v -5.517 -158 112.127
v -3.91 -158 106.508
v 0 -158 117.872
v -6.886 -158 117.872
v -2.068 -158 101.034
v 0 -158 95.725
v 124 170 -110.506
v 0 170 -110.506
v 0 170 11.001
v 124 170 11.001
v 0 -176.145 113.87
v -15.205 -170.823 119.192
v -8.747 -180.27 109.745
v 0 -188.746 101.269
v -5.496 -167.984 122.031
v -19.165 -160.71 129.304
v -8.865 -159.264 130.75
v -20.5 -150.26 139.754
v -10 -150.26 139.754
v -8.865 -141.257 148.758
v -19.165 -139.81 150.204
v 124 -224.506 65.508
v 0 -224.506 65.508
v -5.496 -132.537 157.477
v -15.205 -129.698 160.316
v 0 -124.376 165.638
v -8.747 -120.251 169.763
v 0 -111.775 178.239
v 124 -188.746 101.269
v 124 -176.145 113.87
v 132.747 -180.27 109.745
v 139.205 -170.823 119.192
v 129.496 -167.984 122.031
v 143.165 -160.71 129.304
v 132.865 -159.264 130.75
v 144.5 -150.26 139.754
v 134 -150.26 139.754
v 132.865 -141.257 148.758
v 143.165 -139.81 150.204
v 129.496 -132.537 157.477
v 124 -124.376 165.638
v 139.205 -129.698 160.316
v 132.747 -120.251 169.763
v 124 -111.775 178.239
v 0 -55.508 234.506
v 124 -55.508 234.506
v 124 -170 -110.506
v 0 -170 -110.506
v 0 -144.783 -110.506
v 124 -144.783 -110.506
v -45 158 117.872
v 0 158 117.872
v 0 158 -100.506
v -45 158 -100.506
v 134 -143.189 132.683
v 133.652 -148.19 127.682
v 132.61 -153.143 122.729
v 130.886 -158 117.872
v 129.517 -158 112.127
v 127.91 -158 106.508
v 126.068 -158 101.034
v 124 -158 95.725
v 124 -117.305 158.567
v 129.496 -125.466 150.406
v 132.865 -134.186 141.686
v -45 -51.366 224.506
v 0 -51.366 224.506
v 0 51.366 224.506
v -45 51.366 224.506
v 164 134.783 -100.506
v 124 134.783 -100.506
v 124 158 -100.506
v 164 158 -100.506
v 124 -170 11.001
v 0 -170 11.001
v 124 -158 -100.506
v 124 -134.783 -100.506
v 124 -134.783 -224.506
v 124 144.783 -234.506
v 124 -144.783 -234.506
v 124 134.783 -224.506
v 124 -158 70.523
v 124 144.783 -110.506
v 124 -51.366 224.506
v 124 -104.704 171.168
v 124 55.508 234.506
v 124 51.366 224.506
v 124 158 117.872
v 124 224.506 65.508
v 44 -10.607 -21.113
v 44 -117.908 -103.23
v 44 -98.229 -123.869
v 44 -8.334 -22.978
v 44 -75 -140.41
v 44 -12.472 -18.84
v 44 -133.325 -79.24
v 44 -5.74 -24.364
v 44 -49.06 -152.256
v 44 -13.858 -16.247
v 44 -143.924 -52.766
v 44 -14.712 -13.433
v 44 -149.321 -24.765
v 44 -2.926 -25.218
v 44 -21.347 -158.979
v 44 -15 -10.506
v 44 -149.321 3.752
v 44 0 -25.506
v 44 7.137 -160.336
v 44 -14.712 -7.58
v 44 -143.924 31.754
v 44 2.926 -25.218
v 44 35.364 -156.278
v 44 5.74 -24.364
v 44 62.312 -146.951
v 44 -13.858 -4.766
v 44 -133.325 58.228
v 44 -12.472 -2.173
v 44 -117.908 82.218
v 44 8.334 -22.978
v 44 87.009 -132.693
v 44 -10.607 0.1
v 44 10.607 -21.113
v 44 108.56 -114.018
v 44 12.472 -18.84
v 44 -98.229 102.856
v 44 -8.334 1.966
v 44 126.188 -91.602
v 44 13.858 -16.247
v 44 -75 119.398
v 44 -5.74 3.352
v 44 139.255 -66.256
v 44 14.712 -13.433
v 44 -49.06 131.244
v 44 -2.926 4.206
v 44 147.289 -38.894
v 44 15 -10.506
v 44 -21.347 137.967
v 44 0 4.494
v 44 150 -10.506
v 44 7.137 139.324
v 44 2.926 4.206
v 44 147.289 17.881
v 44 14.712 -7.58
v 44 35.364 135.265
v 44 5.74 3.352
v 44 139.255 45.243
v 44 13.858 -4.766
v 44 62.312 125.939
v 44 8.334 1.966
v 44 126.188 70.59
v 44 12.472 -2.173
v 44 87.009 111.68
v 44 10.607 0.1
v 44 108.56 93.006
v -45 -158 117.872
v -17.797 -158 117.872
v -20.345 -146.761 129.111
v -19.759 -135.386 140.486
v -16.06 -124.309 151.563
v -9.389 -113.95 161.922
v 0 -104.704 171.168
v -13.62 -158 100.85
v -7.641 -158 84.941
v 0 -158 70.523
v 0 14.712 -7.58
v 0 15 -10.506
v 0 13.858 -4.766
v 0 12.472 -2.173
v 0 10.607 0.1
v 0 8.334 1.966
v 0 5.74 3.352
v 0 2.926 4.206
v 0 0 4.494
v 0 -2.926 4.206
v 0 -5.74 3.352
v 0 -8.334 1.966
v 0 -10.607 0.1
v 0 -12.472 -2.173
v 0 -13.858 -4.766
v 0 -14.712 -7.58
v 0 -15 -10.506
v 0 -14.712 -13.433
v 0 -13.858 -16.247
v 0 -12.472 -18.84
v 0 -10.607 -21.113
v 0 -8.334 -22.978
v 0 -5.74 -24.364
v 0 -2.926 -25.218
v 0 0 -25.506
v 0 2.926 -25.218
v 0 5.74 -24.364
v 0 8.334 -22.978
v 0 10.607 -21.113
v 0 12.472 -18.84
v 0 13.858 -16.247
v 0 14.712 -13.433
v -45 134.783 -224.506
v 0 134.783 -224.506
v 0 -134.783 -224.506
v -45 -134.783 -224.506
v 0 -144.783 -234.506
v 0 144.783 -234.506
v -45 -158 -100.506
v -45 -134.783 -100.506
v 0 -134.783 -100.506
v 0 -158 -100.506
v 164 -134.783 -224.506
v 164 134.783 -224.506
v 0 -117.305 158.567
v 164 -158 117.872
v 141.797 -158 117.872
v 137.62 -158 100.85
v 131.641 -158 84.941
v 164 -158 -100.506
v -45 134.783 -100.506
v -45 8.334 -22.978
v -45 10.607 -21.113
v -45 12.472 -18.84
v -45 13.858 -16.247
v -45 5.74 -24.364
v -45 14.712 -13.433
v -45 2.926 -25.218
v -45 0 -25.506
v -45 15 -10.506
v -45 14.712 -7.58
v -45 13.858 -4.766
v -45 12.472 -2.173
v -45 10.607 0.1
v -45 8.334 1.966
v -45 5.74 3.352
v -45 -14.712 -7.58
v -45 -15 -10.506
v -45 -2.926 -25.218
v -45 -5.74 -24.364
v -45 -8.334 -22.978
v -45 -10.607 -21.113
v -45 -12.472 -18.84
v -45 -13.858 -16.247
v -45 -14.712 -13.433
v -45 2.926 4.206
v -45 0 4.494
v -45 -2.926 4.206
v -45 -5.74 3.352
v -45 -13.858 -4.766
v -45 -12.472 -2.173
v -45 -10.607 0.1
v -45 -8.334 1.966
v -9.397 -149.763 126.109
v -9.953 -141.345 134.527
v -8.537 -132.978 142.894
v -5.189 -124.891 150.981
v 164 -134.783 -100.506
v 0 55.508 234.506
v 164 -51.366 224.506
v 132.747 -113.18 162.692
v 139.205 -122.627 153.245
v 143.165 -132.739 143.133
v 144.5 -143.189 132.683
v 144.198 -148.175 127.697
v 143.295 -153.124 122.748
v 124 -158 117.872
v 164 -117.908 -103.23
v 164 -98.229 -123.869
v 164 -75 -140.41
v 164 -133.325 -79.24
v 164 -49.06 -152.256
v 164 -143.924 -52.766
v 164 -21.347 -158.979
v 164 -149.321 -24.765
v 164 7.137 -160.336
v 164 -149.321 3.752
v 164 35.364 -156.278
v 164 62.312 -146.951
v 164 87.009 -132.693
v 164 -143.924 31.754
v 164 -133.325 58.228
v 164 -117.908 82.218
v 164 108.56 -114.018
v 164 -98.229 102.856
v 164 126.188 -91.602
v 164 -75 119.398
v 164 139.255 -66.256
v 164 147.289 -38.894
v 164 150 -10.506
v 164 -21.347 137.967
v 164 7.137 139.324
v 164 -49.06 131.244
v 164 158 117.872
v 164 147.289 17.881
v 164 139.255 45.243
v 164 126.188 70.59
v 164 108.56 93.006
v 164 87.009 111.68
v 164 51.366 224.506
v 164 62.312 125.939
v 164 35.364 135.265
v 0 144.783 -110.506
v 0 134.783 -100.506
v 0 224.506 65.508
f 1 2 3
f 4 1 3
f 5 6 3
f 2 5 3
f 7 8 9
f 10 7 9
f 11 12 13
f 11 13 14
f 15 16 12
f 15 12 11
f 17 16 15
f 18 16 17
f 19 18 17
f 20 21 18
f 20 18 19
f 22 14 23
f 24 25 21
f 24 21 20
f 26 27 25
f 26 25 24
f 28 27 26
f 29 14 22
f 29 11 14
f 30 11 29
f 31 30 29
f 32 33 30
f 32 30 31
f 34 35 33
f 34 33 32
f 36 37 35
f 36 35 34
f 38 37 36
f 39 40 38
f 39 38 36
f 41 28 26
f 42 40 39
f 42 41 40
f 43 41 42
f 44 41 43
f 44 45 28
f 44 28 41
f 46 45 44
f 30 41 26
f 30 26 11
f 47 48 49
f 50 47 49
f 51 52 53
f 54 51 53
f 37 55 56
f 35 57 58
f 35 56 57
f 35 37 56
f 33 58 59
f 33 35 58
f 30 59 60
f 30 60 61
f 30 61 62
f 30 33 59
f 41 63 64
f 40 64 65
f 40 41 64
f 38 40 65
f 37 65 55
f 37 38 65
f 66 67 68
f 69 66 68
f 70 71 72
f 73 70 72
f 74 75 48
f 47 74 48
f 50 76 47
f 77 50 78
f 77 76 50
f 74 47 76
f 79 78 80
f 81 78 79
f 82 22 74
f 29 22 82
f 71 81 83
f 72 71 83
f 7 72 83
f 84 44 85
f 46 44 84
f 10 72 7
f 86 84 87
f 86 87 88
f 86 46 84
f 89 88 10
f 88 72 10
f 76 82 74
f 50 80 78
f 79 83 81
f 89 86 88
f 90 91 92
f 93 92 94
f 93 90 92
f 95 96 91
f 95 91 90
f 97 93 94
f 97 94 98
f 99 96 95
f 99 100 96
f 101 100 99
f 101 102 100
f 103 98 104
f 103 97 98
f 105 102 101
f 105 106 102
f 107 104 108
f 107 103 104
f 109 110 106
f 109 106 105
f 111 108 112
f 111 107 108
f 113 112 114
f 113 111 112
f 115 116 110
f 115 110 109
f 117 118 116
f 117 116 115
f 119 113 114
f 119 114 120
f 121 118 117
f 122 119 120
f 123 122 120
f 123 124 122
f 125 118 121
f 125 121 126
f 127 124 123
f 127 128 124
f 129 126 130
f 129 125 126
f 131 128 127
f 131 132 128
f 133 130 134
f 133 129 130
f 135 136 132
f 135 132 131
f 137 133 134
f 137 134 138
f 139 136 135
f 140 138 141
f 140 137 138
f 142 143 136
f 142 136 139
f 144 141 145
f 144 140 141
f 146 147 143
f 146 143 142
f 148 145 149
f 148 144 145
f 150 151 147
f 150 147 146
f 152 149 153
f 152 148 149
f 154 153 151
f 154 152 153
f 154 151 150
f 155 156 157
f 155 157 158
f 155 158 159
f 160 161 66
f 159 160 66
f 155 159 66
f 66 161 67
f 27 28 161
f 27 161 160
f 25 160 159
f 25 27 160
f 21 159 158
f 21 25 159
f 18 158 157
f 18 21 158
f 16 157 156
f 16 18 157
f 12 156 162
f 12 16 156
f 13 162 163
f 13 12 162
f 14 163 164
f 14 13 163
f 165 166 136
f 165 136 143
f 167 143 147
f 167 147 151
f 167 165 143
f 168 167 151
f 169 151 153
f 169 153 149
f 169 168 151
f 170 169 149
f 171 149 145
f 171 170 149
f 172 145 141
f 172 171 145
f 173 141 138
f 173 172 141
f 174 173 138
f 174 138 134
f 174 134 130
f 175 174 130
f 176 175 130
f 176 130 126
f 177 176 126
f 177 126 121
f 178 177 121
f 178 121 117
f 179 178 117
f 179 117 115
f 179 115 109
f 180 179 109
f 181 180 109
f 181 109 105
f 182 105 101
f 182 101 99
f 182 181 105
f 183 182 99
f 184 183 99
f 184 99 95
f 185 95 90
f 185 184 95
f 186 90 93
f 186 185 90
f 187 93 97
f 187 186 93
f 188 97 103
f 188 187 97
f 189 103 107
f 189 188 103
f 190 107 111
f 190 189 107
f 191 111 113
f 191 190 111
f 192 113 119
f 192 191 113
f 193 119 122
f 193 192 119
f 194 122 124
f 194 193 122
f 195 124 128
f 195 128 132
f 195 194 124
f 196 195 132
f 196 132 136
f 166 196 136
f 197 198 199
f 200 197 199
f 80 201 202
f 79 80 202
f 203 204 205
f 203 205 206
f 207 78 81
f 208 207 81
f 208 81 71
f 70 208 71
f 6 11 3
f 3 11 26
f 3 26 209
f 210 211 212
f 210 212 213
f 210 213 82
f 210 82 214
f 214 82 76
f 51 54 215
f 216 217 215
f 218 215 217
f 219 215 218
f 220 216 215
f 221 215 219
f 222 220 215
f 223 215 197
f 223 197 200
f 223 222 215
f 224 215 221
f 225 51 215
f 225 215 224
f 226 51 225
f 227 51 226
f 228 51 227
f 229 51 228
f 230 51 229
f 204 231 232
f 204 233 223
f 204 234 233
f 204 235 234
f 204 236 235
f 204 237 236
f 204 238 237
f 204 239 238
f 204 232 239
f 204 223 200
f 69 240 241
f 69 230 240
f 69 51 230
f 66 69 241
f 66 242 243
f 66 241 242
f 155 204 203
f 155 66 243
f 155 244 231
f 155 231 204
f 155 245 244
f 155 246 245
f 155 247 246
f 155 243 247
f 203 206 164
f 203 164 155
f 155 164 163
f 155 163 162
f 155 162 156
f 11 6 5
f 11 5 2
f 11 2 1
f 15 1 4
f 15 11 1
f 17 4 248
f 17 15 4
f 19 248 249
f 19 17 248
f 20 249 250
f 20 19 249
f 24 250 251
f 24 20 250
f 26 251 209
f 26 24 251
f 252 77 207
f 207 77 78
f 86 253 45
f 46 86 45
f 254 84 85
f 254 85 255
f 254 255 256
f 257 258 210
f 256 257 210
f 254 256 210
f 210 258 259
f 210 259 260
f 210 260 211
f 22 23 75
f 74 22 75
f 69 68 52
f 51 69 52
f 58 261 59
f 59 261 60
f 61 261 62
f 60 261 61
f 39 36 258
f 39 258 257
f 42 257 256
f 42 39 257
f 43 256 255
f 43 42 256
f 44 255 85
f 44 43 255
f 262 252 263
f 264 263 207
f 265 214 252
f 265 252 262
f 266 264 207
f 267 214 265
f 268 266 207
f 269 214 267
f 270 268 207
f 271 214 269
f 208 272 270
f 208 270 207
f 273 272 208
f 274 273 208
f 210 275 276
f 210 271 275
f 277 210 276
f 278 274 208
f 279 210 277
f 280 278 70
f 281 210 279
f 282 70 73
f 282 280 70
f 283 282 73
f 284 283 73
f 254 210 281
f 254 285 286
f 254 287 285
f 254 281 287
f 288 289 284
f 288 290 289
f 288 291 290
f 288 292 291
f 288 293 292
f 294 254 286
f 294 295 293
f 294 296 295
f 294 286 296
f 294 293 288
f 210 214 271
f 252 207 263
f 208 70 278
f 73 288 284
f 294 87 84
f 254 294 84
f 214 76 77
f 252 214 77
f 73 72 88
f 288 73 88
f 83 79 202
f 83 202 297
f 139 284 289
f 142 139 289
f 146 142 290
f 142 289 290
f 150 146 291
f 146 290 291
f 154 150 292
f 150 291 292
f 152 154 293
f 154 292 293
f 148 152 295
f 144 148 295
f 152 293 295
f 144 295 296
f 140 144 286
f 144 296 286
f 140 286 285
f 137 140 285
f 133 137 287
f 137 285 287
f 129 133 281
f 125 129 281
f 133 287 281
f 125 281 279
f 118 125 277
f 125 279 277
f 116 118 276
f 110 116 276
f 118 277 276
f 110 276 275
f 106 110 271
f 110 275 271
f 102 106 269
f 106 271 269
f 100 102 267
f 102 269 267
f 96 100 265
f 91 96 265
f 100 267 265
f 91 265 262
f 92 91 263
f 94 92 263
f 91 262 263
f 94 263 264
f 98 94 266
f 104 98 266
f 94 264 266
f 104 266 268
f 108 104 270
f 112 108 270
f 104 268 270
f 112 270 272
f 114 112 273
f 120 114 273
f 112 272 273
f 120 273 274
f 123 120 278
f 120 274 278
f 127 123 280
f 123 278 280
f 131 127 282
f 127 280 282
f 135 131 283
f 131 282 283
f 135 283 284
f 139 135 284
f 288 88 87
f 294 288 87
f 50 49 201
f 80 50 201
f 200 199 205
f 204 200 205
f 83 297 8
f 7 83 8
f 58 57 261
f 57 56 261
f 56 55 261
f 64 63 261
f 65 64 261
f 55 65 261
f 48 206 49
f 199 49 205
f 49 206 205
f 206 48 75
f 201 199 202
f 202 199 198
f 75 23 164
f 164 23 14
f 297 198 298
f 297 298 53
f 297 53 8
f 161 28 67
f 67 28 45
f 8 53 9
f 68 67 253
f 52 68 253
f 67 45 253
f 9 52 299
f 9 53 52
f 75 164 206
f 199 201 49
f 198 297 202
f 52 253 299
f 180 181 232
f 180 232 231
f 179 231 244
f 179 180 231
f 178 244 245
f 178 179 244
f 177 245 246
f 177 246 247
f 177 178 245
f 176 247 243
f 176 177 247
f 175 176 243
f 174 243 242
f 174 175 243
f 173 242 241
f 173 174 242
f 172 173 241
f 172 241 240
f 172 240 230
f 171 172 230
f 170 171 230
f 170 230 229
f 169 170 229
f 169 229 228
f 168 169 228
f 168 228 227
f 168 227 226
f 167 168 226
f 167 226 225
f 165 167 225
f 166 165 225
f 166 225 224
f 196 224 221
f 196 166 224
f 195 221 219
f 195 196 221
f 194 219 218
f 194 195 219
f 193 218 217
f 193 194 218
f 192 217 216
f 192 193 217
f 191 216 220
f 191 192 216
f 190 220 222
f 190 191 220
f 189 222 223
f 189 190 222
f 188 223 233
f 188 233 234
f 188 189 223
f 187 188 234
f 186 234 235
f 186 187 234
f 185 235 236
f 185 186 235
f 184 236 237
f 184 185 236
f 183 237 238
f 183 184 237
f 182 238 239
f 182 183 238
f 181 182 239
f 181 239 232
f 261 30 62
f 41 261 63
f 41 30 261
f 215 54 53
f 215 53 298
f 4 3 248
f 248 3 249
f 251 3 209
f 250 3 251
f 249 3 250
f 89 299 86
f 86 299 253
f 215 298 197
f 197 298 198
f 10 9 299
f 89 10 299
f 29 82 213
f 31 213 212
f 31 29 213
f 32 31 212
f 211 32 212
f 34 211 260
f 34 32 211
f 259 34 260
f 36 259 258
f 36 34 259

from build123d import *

# Parameters (mm, degrees)
F0_R     = 15
F1_DEPTH = 124
F3_DEPTH = 40
F4_R     = 15
F5_DEPTH = 45
F7_DEPTH = 100
F8_R     = 150
F8_R_2   = 15
F9_DEPTH = 120


with BuildPart() as f1:
    # F0 (on Right) → F1 (new body)
    with BuildSketch(Plane.YZ):
        Polygon((-55.507882, 234.50625), (-150.260191, 139.753941), (-224.506403, 65.507729), (-170, 11.001326), (-170, -110.50625), (-144.782609, -110.50625), (-144.782609, -234.50625), (144.782609, -234.50625), (144.782609, -110.50625), (170, -110.50625), (170, 11.001326), (224.506403, 65.507729), (150.260191, 139.753941), (55.507882, 234.50625), align=None)
        with Locations((0, -10.50625)):
            Circle(F0_R, mode=Mode.SUBTRACT)
    extrude(amount=F1_DEPTH)

    # F2 (on face) → F3 (join)
    with BuildSketch(Plane.YZ.offset(124)):
        Polygon((0, 224.50625), (-51.3657463763, 224.50625), (-158, 117.8719963763), (-158, -100.50625), (-134.782609, -100.50625), (-134.782609, -224.50625), (0, -224.50625), (134.782609, -224.50625), (134.782609, -100.50625), (158, -100.50625), (158, 117.8719963763), (51.3657463763, 224.50625), align=None)
        with BuildLine():
            ThreePointArc((15, -10.50625), (-10.6066017178, -21.1128517178), (0, 4.49375))
            ThreePointArc((0, 4.49375), (10.6066017178, 0.1003517178), (15, -10.50625))
        make_face(mode=Mode.SUBTRACT)
    extrude(amount=F3_DEPTH)

    # F4 (on face) → F5 (join)
    with BuildSketch(Plane(origin=(0, 0, 0), x_dir=(0, -1, 0), z_dir=(-1, 0, 0))):
        Polygon((134.782609, -100.50625), (158, -100.50625), (158, 117.8719963763), (51.3657463763, 224.50625), (0, 224.50625), (-51.3657463763, 224.50625), (-158, 117.8719963763), (-158, -100.50625), (-134.782609, -100.50625), (-134.782609, -224.50625), (0, -224.50625), (134.782609, -224.50625), align=None)
        with Locations((0, -10.50625)):
            Circle(F4_R, mode=Mode.SUBTRACT)
    extrude(amount=F5_DEPTH)

    # F6 (on face) → F7 (join)
    with BuildSketch(Plane(origin=(0, -145.007066, 145.007066), x_dir=(1, 0, 0), z_dir=(0, -0.7071067812, 0.7071067812))):
        with BuildLine():
            ThreePointArc((124, -61.8555966032), (139.2050840295, -36.5086726323), (144.5, -7.4290405851))
            ThreePointArc((144.5, -7.4290405851), (139.2050840295, 21.6505914621), (124, 46.9975154331))
            Line((124, 46.9975154331), (124, 29.1769698504))
            ThreePointArc((124, 29.1769698504), (131.4550214167, 11.5446253759), (134, -7.4290405851))
            ThreePointArc((134, -7.4290405851), (131.4550214167, -26.4027065461), (124, -44.0350510205))
            Line((124, -44.0350510205), (124, -61.8555966032))
        make_face()
        with BuildLine():
            ThreePointArc((0, -61.8555966032), (62, -89.9290405851), (124, -61.8555966032))
            Line((124, -61.8555966032), (124, -44.0350510205))
            ThreePointArc((124, -44.0350510205), (62, -79.4290405851), (0, -44.0350510205))
            Line((0, -44.0350510205), (0, -61.8555966033))
        make_face()
        with BuildLine():
            Line((0, 29.1769698504), (0, 46.9975154331))
            ThreePointArc((0, 46.9975154331), (-20.5, -7.4290405851), (0, -61.8555966032))
            Line((0, -61.8555966033), (0, -44.0350510205))
            ThreePointArc((0, -44.0350510205), (-10, -7.4290405851), (0, 29.1769698504))
        make_face()
    extrude(amount=-F7_DEPTH)

    # F8 (on face) → F9 (cut)
    with BuildSketch(Plane.YZ.offset(164)):
        with Locations((0, -10.50625)):
            Circle(F8_R)
        with Locations((0, -10.50625)):
            Circle(F8_R_2, mode=Mode.SUBTRACT)
    extrude(amount=-F9_DEPTH, mode=Mode.SUBTRACT)


solid = f1.part
